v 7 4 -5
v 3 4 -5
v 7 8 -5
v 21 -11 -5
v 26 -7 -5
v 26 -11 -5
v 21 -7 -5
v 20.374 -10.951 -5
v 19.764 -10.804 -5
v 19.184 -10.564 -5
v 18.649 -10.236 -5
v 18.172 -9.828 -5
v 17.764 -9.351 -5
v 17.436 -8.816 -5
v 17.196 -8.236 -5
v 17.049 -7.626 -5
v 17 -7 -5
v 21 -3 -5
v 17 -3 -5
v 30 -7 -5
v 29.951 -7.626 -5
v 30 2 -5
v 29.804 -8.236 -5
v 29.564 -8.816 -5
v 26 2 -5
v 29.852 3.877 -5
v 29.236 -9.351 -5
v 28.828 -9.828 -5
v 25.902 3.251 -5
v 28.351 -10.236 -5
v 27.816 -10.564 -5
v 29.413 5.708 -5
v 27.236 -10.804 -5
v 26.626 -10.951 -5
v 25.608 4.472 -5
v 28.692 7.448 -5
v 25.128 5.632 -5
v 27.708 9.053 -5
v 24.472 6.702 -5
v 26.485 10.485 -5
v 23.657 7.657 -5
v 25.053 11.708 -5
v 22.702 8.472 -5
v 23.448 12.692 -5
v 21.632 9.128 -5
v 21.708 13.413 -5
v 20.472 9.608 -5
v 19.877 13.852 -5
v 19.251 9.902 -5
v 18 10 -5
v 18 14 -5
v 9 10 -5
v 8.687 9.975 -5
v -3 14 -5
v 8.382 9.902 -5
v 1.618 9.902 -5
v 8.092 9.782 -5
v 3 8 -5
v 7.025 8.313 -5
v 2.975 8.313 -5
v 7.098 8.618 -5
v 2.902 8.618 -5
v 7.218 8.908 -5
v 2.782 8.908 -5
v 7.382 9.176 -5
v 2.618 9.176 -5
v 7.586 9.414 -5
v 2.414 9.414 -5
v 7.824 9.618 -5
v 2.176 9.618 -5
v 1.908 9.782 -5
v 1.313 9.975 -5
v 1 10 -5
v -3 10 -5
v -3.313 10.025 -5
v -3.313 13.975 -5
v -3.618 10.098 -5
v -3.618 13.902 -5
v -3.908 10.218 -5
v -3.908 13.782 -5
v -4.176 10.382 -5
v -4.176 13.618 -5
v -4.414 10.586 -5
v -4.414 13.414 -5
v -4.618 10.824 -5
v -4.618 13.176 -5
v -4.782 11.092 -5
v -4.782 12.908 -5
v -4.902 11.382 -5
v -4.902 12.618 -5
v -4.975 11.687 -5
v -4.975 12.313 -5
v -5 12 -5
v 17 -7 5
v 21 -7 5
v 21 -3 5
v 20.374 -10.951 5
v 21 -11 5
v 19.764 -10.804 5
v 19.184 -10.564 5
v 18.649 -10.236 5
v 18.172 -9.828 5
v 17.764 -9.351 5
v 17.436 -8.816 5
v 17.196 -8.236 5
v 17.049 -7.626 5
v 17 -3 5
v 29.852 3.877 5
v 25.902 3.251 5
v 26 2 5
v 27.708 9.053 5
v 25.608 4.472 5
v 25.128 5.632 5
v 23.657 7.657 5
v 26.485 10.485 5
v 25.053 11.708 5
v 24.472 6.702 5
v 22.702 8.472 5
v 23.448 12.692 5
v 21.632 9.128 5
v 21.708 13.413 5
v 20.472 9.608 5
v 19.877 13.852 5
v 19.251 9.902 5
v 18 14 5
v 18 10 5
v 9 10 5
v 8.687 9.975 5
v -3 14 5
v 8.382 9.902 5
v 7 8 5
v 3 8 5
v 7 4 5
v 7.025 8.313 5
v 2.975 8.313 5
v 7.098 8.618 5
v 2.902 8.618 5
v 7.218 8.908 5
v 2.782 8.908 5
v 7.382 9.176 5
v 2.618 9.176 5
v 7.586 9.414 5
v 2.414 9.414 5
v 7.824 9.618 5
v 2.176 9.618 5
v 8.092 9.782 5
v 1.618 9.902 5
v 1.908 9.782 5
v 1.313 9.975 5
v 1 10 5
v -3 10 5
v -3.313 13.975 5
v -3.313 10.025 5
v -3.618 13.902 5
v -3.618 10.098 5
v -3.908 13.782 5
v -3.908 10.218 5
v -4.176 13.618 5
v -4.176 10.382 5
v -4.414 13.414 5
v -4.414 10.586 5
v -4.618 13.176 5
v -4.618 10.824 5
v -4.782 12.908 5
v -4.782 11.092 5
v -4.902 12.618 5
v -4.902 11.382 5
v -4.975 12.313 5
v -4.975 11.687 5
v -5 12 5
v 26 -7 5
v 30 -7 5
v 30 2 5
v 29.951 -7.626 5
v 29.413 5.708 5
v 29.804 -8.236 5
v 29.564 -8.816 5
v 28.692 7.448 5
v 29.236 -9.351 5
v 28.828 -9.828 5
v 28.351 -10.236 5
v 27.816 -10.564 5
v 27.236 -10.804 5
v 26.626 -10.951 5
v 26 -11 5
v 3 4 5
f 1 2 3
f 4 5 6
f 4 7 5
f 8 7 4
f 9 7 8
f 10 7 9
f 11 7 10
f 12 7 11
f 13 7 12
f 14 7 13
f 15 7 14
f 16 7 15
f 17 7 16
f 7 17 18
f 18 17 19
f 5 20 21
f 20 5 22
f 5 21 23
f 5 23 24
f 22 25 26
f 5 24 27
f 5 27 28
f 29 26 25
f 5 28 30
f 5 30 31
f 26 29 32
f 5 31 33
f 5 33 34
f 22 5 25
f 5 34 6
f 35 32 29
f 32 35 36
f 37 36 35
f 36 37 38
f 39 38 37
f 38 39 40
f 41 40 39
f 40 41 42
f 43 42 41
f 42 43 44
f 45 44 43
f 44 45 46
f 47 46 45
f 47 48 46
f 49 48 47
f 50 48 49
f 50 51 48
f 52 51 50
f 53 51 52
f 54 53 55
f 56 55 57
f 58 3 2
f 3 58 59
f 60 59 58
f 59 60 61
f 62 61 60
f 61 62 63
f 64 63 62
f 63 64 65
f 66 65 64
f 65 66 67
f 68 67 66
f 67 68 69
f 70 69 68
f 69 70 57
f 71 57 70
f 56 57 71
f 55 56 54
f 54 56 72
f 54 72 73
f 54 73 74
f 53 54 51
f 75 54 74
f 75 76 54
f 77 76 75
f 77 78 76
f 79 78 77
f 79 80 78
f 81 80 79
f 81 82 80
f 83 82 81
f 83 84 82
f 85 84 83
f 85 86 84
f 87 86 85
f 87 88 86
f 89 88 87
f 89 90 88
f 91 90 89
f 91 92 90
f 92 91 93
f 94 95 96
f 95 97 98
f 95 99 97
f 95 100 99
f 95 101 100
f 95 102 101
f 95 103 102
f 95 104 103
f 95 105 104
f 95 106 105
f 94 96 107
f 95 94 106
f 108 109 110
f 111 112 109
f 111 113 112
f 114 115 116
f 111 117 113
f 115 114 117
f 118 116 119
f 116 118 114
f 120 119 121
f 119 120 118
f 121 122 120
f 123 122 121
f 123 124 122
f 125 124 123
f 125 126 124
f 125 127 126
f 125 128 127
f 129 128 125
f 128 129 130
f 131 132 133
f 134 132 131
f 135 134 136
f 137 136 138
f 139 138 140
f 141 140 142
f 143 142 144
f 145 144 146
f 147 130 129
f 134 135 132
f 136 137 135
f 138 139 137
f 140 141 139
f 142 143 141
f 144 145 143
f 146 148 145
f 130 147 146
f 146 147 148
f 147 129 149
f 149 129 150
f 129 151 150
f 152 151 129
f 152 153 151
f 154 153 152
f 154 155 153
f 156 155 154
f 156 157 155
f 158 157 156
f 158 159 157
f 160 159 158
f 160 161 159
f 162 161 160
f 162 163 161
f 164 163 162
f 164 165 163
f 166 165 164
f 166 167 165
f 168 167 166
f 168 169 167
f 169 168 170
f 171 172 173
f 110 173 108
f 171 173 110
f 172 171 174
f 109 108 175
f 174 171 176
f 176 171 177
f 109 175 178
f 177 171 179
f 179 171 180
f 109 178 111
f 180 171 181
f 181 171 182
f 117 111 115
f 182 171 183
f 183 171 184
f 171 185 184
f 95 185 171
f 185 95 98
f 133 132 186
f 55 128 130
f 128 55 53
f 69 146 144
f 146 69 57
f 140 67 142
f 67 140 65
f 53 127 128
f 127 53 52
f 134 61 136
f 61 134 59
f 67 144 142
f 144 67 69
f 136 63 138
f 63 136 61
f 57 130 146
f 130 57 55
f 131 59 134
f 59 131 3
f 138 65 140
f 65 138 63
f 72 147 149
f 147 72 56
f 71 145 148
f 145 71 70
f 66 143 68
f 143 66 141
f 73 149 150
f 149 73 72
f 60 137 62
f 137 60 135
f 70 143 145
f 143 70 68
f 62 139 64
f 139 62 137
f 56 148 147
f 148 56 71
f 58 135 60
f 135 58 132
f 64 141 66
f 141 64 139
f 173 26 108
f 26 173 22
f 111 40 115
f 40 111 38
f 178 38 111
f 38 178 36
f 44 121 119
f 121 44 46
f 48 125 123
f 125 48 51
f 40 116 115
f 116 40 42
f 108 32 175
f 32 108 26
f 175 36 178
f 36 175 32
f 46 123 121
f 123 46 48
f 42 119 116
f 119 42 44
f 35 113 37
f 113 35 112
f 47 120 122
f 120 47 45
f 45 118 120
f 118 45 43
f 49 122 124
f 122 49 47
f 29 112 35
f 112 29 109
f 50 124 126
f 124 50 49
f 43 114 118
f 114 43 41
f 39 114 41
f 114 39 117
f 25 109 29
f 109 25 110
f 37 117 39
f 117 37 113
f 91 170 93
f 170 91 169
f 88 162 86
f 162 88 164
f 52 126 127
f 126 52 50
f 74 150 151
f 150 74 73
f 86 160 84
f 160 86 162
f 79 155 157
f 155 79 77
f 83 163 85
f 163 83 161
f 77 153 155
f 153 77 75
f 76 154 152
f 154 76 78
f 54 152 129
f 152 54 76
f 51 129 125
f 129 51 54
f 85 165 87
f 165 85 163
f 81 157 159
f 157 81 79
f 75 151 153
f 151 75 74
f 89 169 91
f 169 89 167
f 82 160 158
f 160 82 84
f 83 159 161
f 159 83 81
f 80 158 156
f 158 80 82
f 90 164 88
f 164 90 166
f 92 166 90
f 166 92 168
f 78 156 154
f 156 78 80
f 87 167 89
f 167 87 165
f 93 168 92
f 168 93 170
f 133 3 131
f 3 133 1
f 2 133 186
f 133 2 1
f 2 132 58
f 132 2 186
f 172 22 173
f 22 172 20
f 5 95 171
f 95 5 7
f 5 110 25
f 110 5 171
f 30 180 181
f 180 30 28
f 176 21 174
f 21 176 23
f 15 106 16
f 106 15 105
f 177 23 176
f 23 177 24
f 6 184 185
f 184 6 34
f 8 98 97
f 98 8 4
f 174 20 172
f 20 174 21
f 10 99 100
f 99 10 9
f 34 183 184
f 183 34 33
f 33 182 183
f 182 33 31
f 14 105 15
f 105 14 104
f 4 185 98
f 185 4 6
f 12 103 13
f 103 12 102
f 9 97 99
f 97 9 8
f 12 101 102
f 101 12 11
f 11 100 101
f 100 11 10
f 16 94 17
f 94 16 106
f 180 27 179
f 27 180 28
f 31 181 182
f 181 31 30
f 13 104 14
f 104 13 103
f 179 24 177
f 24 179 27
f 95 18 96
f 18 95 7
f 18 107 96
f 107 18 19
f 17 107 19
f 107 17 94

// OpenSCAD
//Clip for plastic storage box
//by Khairulmizam Samsudin, Sept 2016
//xource@gmail.com
//"clip_lid_storage_box" is licenced under Creative Commons :
//Attribution-NonCommercial-ShareAlike 4.0 International (CC BY-NC-SA 4.0)
//http://creativecommons.org/licenses/by-nc-sa/4.0/

//UPDATES:
//7/10/2016 - Released

/* [Options] */
// preview[view:south east, tilt:top diagonal]
// Clip thickness.
Clip_thickness=4; // [1:10]
// Width of the clip.
Clip_width=10; // [5:50]
// Section A length.
Section_A=6; // [3:10]
// Section B length.
Section_B=6; // [2:10]
// Section B fillet radius.
Section_BR=2; // [0:5]
// Section C length.
Section_C=19; // [10:30]
// Section C fillet radius.
Section_CR=8; // [0:20]
// Section D length.
Section_D=17; // [5:20]
// Section E length.
Section_E=5; // [5:20]
// Section F length.
Section_F=4; // [4:20]
// Number of clip to generate
Clip_number=1; // [1:4]

/* [Hidden] */
N=Clip_number; 
W=Clip_width;
T=Clip_thickness;
aL=Section_A;
aW=W;
aT=T;
R1=Section_BR;
bL=T;
bW=W;
bT=Section_B;
cL=Section_C;
cW=W;
cT=T;
R2=Section_CR;
dL=T;
dW=W;
dT=Section_D;
eL=Section_E;
eW=W;
eT=T;
fL=T;
fW=W;
fT=Section_F;

$fn=40;
epsilon=0.1;
module ocylinder(r1,r2,h) {
    difference() {
        cylinder(r=r1,h=h,center=true);
        cylinder(r=r2,h=h+epsilon,center=true);
    }
}

module a() {
    hull() {
        translate([-cL/2-aL-T,0,0]) rotate([90,0,0]) cylinder(r=T/2,h=W,center=true);
        translate([-0.5-cL/2-T,0,0]) cube([1,cW,cT],center=true);
    }
}

module fillet(R) {
    difference() {
        rotate([90,0,0]) ocylinder(r1=R+T,r2=R,h=W);
        coL=R+T;
        coW=W;
        coT=coL*2;
        //translate([coL/2+epsilon,0,0]) cube([coL+epsilon,coW+epsilon,coT],center=true);
        //translate([0,0,-coL/2-epsilon]) cube([coT+epsilon,coW+epsilon,coL+epsilon],center=true);
        translate([coT/2,0,0]) cube([coT,coW+epsilon,coT],center=true);
        translate([0,0,-coT/2]) cube([coT,coW+epsilon,coT],center=true);
    }
}

module lid_clip() {
    hull() {
        a();
        translate([-R2/2,0,0]) cube([cL-R2,cW,cT],center=true);
    }
    translate([R1-cL/2,0,-R1-T/2]) fillet(R=R1);
    translate([R1-cL/2-R1*2-T,0,-R1-T/2]) mirror([1,0,0]) fillet(R=R1);
    translate([-bL/2-cL/2,0,-bT/2-cT/2]) cube([bL,cW,bT],center=true);
    translate([-R2+cL/2,0,-R2-T/2]) mirror([1,0,0]) fillet(R=R2);
    translate([cL/2+dL/2,0,-dT/2-cT/2-R2/2]) cube([dL,dW,dT-R2],center=true);
    hull() {
        translate([cL/2,0,-dT-T/2]) rotate([0,180,0]) fillet(R=0);
        translate([-eL/2+cL/2,0,-eT-dT]) cube([eL,eW,eT],center=true);
        translate([cL/2-eL,0,-dT-T/2]) rotate([0,-90,0]) fillet(R=0);
    }
    translate([-fL/2+cL/2-eL,0,fT/2-dT-T/2]) cube([fL,fW,fT],center=true);
}

module c1() {
    rotate([-90,0,0]) translate([cL/2+bL+aL/2,0,aT/2+bT+T]) lid_clip();
}


c1();
if (N>1) { rotate([0,0,90]) c1(); }
if (N>2) { rotate([0,0,180]) c1(); }
if (N>3) { rotate([0,0,270]) c1(); }

//translate([-T,0,-cL/2-bL-aL-T*2]) rotate([0,90,0]) lid_clip();
